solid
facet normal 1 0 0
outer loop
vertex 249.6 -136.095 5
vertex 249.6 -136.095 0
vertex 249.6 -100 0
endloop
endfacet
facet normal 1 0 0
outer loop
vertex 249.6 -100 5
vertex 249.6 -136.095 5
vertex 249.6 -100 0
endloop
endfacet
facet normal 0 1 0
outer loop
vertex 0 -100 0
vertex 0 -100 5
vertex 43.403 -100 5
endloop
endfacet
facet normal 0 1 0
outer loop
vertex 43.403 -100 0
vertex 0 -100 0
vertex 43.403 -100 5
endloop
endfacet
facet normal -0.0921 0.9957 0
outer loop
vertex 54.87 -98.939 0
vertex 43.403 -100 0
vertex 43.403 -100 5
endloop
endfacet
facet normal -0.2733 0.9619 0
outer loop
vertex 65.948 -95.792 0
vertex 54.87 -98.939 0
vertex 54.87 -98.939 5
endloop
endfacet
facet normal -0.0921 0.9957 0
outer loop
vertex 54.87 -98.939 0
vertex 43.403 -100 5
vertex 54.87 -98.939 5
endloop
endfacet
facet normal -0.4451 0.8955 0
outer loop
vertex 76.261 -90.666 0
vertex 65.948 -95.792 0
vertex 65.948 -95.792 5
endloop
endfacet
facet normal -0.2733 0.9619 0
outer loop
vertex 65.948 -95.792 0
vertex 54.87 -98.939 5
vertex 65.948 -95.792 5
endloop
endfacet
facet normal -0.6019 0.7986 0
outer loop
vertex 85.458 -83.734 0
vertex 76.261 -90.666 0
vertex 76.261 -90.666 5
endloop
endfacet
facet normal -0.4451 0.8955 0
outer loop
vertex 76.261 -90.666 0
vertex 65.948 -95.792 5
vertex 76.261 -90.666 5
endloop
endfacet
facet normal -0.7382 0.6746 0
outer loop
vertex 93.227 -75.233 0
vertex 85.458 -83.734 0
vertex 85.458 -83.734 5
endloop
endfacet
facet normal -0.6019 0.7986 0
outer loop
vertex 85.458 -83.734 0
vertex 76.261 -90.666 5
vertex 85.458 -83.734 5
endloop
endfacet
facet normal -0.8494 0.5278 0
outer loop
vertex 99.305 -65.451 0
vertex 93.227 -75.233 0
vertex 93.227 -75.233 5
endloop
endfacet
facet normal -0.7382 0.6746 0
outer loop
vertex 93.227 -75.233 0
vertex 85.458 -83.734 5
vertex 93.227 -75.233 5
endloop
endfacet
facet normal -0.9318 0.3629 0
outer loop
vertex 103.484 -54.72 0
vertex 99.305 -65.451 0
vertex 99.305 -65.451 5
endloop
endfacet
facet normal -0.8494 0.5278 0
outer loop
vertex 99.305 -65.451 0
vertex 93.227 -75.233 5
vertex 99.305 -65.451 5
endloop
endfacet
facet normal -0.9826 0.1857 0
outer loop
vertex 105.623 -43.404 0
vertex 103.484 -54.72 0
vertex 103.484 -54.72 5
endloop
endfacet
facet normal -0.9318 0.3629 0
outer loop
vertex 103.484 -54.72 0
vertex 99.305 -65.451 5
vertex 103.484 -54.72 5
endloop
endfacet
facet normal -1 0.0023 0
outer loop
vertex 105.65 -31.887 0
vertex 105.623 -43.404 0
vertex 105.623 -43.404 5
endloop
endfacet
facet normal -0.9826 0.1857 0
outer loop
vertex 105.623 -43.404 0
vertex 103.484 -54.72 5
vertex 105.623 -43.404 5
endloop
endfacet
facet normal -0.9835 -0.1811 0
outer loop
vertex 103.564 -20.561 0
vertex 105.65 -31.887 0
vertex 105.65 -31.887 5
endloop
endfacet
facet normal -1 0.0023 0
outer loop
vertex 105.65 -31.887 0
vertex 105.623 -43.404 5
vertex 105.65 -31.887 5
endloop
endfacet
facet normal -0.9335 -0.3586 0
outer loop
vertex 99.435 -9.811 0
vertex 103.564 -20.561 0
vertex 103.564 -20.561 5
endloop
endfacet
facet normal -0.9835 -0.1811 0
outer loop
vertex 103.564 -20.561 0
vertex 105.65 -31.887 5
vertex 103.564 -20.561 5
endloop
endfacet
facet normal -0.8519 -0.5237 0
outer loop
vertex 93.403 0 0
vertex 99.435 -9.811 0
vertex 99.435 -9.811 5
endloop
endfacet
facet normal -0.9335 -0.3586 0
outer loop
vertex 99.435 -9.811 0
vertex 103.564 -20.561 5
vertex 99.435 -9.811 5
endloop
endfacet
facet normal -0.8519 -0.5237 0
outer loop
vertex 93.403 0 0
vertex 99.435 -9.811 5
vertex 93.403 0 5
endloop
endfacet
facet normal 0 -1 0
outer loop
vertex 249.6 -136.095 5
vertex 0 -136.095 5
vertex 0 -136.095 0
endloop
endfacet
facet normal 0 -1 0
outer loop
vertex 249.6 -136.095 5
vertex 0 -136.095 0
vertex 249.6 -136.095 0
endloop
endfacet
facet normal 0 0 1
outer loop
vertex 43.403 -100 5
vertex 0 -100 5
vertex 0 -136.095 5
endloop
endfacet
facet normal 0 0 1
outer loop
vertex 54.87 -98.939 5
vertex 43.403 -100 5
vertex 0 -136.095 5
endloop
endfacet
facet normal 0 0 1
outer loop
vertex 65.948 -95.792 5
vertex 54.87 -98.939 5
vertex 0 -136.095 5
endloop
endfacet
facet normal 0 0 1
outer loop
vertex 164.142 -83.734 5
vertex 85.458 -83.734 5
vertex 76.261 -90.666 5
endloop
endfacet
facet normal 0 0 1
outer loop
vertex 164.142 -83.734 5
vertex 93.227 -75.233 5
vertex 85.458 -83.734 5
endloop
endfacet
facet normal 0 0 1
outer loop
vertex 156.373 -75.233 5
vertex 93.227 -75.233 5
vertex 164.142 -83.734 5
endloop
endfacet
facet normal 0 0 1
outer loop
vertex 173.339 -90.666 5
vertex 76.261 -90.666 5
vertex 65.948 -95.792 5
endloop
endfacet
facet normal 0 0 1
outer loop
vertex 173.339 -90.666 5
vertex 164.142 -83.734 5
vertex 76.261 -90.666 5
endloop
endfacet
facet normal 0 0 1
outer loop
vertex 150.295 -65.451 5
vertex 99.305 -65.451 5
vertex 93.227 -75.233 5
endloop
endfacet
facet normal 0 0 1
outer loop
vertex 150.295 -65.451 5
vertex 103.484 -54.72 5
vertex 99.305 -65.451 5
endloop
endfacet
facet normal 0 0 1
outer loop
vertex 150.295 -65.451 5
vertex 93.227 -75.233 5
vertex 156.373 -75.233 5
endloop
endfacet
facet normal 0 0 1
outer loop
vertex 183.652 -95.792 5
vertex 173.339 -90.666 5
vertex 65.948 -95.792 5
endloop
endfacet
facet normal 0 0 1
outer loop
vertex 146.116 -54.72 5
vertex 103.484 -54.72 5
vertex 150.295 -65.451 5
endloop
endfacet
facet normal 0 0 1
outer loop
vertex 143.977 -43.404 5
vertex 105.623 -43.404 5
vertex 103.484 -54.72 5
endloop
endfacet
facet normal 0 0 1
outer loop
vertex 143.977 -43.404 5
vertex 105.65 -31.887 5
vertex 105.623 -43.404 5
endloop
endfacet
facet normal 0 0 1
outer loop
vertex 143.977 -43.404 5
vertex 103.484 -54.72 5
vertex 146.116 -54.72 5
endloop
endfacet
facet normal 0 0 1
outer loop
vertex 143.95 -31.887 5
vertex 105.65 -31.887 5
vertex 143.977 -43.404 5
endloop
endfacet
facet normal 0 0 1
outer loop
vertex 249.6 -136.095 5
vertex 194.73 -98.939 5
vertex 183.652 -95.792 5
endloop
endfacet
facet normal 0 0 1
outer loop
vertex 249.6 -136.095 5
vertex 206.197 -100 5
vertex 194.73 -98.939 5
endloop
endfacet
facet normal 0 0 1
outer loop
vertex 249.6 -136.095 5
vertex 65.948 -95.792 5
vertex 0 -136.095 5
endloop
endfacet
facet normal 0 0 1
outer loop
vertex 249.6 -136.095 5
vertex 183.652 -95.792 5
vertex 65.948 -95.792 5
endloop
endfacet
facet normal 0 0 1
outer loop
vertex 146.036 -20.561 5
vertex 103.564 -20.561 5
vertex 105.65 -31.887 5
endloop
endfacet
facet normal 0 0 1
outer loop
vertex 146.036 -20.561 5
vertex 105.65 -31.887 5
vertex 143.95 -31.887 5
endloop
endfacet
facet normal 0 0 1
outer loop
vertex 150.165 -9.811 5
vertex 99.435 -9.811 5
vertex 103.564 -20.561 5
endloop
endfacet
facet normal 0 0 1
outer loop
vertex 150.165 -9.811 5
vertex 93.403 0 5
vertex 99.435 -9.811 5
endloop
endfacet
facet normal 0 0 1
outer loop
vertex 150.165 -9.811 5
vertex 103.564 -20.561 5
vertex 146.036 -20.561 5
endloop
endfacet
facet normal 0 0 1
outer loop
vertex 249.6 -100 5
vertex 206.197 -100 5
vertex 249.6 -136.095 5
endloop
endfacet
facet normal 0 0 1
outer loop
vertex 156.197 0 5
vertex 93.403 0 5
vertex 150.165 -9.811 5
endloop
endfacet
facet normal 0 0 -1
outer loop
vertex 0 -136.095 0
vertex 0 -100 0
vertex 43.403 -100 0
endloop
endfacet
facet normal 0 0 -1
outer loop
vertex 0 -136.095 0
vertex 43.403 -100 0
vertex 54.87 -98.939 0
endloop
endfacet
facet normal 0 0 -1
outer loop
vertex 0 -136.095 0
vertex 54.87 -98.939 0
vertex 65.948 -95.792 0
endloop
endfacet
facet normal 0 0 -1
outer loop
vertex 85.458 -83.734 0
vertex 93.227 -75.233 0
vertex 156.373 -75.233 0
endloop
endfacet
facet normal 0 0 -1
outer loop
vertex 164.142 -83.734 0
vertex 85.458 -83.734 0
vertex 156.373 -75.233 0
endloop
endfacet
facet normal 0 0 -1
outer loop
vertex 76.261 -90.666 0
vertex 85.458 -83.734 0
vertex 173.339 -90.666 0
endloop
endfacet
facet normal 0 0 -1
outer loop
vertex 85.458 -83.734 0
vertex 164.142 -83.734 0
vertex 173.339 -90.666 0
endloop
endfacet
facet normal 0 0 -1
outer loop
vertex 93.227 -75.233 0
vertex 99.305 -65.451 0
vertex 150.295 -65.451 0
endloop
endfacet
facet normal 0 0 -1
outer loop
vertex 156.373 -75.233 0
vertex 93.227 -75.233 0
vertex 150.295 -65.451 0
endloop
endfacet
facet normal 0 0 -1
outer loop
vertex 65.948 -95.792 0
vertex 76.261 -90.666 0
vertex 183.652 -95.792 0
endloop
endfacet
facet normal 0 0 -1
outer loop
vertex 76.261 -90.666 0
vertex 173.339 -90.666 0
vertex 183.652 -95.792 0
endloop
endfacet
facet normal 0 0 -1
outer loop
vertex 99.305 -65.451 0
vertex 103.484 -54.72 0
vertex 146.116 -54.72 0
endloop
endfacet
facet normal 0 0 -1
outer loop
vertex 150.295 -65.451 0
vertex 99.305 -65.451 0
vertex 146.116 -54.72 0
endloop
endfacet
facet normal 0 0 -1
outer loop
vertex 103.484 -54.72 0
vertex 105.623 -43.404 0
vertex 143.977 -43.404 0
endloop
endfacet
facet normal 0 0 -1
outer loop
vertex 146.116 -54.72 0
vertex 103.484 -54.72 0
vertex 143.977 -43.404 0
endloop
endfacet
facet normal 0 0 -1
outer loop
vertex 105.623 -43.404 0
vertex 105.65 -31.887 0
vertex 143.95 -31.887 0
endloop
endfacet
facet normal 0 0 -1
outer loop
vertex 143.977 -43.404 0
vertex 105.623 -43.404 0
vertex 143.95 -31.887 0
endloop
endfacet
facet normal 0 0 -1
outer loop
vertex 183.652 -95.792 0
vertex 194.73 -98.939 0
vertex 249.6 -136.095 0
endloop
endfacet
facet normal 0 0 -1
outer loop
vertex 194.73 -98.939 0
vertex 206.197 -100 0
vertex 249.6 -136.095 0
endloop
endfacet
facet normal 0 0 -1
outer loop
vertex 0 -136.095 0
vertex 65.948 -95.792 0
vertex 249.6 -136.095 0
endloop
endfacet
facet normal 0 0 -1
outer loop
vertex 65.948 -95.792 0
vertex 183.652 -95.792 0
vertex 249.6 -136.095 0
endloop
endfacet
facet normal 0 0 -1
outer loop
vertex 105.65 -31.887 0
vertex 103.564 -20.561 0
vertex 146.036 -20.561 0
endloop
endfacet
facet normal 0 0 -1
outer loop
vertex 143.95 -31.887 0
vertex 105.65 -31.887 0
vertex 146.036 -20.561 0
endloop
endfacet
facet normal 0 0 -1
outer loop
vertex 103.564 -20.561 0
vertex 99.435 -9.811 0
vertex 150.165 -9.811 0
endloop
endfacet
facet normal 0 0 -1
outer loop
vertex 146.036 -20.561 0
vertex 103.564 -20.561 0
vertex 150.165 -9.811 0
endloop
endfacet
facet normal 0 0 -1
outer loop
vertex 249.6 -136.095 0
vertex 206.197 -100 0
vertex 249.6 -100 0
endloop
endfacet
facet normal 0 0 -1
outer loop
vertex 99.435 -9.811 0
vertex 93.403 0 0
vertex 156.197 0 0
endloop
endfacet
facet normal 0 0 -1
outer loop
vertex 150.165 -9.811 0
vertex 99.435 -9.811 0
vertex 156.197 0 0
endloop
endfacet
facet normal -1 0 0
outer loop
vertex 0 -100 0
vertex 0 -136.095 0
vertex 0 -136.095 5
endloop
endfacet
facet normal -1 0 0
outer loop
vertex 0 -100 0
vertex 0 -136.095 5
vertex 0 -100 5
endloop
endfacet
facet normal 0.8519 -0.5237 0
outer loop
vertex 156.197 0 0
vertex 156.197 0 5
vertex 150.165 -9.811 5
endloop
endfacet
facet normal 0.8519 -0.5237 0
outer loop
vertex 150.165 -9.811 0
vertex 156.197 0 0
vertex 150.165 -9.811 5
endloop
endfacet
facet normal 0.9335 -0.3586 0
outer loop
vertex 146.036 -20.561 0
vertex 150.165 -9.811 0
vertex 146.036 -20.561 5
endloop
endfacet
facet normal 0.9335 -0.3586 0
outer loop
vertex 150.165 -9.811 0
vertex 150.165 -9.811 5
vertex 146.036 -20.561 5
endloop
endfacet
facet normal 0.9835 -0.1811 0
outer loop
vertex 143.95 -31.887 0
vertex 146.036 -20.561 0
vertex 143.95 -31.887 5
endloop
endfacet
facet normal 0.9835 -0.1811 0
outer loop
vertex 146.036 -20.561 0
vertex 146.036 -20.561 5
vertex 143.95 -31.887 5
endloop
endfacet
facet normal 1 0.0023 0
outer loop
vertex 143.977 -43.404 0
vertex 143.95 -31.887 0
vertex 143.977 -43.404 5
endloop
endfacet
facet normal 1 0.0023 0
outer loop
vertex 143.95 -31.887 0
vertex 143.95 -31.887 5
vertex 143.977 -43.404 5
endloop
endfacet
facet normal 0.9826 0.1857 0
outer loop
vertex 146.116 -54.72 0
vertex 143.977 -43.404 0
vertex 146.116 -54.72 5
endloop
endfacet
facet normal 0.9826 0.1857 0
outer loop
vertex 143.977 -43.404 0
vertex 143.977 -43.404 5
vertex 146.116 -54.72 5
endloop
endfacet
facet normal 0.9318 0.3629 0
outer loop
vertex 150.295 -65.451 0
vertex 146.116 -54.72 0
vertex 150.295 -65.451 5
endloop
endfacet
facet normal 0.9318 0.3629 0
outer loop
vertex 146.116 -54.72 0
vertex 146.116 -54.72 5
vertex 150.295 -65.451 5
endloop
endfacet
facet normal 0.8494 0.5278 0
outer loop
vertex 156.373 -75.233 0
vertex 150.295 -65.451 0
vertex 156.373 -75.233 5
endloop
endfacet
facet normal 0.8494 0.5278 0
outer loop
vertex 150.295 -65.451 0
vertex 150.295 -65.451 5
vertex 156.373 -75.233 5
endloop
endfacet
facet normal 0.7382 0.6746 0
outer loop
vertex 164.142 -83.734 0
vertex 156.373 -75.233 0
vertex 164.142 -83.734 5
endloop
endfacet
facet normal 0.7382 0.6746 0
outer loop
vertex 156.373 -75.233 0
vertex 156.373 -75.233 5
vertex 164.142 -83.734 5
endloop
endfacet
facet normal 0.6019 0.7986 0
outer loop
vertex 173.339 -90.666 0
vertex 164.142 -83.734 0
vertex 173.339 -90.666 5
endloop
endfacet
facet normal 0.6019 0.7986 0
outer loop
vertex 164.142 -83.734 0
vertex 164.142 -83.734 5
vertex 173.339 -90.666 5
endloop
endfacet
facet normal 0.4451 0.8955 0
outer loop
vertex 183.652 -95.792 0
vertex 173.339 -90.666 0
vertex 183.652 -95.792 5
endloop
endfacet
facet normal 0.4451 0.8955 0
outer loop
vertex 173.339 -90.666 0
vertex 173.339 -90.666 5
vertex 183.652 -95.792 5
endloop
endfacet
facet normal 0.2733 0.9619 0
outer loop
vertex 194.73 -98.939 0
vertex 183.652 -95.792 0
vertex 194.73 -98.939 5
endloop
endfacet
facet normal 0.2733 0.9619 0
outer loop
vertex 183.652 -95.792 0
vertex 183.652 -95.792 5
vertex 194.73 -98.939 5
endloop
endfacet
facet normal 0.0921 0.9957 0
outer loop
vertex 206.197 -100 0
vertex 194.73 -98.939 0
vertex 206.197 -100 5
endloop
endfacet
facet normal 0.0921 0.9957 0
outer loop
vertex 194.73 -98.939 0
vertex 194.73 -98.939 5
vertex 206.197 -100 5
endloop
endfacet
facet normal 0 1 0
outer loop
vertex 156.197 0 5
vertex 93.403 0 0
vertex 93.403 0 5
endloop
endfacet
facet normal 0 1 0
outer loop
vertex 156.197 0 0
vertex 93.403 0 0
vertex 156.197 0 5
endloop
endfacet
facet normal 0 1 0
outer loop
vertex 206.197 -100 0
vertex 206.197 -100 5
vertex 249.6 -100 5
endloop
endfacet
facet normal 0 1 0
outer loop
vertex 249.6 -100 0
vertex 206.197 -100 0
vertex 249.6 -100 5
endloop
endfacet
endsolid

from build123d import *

# Parameters (mm, degrees)
SKETCH1_W           = 249.6
SKETCH1_H           = 267.4
BOSS_EXTRUDE1_DEPTH = 5
SKETCH5_W           = 249.6
SKETCH5_H           = 131.304588604
CUT_EXTRUDE3_DEPTH  = 6


with BuildPart() as part:
    # Sketch1 → Boss-Extrude1 (new body)
    with BuildSketch(Plane.XY):
        with Locations((124.8, -133.7)):
            Rectangle(SKETCH1_W, SKETCH1_H)
    extrude(amount=BOSS_EXTRUDE1_DEPTH)

    # Sketch5 → Cut-Extrude3 (cut, through all)
    with BuildSketch(Plane.XY.offset(5)):
        with Locations((124.8, -201.747705698)):
            Rectangle(SKETCH5_W, SKETCH5_H)
        with BuildLine():
            Line((249.6, 25), (206.197139999, 25))
            ThreePointArc((206.197139999, 25), (143.697139999, -37.5), (206.197139999, -100))
            Line((206.197139999, -100), (249.6, -100))
            Line((249.6, -100), (249.6, 25))
        make_face()
        with BuildLine():
            Line((0, 25), (0, -100))
            Line((0, -100), (43.402860001, -100))
            ThreePointArc((43.402860001, -100), (105.902860001, -37.5), (43.402860001, 25))
            Line((43.402860001, 25), (0, 25))
        make_face()
    extrude(amount=-CUT_EXTRUDE3_DEPTH, mode=Mode.SUBTRACT)


solid = part.part
